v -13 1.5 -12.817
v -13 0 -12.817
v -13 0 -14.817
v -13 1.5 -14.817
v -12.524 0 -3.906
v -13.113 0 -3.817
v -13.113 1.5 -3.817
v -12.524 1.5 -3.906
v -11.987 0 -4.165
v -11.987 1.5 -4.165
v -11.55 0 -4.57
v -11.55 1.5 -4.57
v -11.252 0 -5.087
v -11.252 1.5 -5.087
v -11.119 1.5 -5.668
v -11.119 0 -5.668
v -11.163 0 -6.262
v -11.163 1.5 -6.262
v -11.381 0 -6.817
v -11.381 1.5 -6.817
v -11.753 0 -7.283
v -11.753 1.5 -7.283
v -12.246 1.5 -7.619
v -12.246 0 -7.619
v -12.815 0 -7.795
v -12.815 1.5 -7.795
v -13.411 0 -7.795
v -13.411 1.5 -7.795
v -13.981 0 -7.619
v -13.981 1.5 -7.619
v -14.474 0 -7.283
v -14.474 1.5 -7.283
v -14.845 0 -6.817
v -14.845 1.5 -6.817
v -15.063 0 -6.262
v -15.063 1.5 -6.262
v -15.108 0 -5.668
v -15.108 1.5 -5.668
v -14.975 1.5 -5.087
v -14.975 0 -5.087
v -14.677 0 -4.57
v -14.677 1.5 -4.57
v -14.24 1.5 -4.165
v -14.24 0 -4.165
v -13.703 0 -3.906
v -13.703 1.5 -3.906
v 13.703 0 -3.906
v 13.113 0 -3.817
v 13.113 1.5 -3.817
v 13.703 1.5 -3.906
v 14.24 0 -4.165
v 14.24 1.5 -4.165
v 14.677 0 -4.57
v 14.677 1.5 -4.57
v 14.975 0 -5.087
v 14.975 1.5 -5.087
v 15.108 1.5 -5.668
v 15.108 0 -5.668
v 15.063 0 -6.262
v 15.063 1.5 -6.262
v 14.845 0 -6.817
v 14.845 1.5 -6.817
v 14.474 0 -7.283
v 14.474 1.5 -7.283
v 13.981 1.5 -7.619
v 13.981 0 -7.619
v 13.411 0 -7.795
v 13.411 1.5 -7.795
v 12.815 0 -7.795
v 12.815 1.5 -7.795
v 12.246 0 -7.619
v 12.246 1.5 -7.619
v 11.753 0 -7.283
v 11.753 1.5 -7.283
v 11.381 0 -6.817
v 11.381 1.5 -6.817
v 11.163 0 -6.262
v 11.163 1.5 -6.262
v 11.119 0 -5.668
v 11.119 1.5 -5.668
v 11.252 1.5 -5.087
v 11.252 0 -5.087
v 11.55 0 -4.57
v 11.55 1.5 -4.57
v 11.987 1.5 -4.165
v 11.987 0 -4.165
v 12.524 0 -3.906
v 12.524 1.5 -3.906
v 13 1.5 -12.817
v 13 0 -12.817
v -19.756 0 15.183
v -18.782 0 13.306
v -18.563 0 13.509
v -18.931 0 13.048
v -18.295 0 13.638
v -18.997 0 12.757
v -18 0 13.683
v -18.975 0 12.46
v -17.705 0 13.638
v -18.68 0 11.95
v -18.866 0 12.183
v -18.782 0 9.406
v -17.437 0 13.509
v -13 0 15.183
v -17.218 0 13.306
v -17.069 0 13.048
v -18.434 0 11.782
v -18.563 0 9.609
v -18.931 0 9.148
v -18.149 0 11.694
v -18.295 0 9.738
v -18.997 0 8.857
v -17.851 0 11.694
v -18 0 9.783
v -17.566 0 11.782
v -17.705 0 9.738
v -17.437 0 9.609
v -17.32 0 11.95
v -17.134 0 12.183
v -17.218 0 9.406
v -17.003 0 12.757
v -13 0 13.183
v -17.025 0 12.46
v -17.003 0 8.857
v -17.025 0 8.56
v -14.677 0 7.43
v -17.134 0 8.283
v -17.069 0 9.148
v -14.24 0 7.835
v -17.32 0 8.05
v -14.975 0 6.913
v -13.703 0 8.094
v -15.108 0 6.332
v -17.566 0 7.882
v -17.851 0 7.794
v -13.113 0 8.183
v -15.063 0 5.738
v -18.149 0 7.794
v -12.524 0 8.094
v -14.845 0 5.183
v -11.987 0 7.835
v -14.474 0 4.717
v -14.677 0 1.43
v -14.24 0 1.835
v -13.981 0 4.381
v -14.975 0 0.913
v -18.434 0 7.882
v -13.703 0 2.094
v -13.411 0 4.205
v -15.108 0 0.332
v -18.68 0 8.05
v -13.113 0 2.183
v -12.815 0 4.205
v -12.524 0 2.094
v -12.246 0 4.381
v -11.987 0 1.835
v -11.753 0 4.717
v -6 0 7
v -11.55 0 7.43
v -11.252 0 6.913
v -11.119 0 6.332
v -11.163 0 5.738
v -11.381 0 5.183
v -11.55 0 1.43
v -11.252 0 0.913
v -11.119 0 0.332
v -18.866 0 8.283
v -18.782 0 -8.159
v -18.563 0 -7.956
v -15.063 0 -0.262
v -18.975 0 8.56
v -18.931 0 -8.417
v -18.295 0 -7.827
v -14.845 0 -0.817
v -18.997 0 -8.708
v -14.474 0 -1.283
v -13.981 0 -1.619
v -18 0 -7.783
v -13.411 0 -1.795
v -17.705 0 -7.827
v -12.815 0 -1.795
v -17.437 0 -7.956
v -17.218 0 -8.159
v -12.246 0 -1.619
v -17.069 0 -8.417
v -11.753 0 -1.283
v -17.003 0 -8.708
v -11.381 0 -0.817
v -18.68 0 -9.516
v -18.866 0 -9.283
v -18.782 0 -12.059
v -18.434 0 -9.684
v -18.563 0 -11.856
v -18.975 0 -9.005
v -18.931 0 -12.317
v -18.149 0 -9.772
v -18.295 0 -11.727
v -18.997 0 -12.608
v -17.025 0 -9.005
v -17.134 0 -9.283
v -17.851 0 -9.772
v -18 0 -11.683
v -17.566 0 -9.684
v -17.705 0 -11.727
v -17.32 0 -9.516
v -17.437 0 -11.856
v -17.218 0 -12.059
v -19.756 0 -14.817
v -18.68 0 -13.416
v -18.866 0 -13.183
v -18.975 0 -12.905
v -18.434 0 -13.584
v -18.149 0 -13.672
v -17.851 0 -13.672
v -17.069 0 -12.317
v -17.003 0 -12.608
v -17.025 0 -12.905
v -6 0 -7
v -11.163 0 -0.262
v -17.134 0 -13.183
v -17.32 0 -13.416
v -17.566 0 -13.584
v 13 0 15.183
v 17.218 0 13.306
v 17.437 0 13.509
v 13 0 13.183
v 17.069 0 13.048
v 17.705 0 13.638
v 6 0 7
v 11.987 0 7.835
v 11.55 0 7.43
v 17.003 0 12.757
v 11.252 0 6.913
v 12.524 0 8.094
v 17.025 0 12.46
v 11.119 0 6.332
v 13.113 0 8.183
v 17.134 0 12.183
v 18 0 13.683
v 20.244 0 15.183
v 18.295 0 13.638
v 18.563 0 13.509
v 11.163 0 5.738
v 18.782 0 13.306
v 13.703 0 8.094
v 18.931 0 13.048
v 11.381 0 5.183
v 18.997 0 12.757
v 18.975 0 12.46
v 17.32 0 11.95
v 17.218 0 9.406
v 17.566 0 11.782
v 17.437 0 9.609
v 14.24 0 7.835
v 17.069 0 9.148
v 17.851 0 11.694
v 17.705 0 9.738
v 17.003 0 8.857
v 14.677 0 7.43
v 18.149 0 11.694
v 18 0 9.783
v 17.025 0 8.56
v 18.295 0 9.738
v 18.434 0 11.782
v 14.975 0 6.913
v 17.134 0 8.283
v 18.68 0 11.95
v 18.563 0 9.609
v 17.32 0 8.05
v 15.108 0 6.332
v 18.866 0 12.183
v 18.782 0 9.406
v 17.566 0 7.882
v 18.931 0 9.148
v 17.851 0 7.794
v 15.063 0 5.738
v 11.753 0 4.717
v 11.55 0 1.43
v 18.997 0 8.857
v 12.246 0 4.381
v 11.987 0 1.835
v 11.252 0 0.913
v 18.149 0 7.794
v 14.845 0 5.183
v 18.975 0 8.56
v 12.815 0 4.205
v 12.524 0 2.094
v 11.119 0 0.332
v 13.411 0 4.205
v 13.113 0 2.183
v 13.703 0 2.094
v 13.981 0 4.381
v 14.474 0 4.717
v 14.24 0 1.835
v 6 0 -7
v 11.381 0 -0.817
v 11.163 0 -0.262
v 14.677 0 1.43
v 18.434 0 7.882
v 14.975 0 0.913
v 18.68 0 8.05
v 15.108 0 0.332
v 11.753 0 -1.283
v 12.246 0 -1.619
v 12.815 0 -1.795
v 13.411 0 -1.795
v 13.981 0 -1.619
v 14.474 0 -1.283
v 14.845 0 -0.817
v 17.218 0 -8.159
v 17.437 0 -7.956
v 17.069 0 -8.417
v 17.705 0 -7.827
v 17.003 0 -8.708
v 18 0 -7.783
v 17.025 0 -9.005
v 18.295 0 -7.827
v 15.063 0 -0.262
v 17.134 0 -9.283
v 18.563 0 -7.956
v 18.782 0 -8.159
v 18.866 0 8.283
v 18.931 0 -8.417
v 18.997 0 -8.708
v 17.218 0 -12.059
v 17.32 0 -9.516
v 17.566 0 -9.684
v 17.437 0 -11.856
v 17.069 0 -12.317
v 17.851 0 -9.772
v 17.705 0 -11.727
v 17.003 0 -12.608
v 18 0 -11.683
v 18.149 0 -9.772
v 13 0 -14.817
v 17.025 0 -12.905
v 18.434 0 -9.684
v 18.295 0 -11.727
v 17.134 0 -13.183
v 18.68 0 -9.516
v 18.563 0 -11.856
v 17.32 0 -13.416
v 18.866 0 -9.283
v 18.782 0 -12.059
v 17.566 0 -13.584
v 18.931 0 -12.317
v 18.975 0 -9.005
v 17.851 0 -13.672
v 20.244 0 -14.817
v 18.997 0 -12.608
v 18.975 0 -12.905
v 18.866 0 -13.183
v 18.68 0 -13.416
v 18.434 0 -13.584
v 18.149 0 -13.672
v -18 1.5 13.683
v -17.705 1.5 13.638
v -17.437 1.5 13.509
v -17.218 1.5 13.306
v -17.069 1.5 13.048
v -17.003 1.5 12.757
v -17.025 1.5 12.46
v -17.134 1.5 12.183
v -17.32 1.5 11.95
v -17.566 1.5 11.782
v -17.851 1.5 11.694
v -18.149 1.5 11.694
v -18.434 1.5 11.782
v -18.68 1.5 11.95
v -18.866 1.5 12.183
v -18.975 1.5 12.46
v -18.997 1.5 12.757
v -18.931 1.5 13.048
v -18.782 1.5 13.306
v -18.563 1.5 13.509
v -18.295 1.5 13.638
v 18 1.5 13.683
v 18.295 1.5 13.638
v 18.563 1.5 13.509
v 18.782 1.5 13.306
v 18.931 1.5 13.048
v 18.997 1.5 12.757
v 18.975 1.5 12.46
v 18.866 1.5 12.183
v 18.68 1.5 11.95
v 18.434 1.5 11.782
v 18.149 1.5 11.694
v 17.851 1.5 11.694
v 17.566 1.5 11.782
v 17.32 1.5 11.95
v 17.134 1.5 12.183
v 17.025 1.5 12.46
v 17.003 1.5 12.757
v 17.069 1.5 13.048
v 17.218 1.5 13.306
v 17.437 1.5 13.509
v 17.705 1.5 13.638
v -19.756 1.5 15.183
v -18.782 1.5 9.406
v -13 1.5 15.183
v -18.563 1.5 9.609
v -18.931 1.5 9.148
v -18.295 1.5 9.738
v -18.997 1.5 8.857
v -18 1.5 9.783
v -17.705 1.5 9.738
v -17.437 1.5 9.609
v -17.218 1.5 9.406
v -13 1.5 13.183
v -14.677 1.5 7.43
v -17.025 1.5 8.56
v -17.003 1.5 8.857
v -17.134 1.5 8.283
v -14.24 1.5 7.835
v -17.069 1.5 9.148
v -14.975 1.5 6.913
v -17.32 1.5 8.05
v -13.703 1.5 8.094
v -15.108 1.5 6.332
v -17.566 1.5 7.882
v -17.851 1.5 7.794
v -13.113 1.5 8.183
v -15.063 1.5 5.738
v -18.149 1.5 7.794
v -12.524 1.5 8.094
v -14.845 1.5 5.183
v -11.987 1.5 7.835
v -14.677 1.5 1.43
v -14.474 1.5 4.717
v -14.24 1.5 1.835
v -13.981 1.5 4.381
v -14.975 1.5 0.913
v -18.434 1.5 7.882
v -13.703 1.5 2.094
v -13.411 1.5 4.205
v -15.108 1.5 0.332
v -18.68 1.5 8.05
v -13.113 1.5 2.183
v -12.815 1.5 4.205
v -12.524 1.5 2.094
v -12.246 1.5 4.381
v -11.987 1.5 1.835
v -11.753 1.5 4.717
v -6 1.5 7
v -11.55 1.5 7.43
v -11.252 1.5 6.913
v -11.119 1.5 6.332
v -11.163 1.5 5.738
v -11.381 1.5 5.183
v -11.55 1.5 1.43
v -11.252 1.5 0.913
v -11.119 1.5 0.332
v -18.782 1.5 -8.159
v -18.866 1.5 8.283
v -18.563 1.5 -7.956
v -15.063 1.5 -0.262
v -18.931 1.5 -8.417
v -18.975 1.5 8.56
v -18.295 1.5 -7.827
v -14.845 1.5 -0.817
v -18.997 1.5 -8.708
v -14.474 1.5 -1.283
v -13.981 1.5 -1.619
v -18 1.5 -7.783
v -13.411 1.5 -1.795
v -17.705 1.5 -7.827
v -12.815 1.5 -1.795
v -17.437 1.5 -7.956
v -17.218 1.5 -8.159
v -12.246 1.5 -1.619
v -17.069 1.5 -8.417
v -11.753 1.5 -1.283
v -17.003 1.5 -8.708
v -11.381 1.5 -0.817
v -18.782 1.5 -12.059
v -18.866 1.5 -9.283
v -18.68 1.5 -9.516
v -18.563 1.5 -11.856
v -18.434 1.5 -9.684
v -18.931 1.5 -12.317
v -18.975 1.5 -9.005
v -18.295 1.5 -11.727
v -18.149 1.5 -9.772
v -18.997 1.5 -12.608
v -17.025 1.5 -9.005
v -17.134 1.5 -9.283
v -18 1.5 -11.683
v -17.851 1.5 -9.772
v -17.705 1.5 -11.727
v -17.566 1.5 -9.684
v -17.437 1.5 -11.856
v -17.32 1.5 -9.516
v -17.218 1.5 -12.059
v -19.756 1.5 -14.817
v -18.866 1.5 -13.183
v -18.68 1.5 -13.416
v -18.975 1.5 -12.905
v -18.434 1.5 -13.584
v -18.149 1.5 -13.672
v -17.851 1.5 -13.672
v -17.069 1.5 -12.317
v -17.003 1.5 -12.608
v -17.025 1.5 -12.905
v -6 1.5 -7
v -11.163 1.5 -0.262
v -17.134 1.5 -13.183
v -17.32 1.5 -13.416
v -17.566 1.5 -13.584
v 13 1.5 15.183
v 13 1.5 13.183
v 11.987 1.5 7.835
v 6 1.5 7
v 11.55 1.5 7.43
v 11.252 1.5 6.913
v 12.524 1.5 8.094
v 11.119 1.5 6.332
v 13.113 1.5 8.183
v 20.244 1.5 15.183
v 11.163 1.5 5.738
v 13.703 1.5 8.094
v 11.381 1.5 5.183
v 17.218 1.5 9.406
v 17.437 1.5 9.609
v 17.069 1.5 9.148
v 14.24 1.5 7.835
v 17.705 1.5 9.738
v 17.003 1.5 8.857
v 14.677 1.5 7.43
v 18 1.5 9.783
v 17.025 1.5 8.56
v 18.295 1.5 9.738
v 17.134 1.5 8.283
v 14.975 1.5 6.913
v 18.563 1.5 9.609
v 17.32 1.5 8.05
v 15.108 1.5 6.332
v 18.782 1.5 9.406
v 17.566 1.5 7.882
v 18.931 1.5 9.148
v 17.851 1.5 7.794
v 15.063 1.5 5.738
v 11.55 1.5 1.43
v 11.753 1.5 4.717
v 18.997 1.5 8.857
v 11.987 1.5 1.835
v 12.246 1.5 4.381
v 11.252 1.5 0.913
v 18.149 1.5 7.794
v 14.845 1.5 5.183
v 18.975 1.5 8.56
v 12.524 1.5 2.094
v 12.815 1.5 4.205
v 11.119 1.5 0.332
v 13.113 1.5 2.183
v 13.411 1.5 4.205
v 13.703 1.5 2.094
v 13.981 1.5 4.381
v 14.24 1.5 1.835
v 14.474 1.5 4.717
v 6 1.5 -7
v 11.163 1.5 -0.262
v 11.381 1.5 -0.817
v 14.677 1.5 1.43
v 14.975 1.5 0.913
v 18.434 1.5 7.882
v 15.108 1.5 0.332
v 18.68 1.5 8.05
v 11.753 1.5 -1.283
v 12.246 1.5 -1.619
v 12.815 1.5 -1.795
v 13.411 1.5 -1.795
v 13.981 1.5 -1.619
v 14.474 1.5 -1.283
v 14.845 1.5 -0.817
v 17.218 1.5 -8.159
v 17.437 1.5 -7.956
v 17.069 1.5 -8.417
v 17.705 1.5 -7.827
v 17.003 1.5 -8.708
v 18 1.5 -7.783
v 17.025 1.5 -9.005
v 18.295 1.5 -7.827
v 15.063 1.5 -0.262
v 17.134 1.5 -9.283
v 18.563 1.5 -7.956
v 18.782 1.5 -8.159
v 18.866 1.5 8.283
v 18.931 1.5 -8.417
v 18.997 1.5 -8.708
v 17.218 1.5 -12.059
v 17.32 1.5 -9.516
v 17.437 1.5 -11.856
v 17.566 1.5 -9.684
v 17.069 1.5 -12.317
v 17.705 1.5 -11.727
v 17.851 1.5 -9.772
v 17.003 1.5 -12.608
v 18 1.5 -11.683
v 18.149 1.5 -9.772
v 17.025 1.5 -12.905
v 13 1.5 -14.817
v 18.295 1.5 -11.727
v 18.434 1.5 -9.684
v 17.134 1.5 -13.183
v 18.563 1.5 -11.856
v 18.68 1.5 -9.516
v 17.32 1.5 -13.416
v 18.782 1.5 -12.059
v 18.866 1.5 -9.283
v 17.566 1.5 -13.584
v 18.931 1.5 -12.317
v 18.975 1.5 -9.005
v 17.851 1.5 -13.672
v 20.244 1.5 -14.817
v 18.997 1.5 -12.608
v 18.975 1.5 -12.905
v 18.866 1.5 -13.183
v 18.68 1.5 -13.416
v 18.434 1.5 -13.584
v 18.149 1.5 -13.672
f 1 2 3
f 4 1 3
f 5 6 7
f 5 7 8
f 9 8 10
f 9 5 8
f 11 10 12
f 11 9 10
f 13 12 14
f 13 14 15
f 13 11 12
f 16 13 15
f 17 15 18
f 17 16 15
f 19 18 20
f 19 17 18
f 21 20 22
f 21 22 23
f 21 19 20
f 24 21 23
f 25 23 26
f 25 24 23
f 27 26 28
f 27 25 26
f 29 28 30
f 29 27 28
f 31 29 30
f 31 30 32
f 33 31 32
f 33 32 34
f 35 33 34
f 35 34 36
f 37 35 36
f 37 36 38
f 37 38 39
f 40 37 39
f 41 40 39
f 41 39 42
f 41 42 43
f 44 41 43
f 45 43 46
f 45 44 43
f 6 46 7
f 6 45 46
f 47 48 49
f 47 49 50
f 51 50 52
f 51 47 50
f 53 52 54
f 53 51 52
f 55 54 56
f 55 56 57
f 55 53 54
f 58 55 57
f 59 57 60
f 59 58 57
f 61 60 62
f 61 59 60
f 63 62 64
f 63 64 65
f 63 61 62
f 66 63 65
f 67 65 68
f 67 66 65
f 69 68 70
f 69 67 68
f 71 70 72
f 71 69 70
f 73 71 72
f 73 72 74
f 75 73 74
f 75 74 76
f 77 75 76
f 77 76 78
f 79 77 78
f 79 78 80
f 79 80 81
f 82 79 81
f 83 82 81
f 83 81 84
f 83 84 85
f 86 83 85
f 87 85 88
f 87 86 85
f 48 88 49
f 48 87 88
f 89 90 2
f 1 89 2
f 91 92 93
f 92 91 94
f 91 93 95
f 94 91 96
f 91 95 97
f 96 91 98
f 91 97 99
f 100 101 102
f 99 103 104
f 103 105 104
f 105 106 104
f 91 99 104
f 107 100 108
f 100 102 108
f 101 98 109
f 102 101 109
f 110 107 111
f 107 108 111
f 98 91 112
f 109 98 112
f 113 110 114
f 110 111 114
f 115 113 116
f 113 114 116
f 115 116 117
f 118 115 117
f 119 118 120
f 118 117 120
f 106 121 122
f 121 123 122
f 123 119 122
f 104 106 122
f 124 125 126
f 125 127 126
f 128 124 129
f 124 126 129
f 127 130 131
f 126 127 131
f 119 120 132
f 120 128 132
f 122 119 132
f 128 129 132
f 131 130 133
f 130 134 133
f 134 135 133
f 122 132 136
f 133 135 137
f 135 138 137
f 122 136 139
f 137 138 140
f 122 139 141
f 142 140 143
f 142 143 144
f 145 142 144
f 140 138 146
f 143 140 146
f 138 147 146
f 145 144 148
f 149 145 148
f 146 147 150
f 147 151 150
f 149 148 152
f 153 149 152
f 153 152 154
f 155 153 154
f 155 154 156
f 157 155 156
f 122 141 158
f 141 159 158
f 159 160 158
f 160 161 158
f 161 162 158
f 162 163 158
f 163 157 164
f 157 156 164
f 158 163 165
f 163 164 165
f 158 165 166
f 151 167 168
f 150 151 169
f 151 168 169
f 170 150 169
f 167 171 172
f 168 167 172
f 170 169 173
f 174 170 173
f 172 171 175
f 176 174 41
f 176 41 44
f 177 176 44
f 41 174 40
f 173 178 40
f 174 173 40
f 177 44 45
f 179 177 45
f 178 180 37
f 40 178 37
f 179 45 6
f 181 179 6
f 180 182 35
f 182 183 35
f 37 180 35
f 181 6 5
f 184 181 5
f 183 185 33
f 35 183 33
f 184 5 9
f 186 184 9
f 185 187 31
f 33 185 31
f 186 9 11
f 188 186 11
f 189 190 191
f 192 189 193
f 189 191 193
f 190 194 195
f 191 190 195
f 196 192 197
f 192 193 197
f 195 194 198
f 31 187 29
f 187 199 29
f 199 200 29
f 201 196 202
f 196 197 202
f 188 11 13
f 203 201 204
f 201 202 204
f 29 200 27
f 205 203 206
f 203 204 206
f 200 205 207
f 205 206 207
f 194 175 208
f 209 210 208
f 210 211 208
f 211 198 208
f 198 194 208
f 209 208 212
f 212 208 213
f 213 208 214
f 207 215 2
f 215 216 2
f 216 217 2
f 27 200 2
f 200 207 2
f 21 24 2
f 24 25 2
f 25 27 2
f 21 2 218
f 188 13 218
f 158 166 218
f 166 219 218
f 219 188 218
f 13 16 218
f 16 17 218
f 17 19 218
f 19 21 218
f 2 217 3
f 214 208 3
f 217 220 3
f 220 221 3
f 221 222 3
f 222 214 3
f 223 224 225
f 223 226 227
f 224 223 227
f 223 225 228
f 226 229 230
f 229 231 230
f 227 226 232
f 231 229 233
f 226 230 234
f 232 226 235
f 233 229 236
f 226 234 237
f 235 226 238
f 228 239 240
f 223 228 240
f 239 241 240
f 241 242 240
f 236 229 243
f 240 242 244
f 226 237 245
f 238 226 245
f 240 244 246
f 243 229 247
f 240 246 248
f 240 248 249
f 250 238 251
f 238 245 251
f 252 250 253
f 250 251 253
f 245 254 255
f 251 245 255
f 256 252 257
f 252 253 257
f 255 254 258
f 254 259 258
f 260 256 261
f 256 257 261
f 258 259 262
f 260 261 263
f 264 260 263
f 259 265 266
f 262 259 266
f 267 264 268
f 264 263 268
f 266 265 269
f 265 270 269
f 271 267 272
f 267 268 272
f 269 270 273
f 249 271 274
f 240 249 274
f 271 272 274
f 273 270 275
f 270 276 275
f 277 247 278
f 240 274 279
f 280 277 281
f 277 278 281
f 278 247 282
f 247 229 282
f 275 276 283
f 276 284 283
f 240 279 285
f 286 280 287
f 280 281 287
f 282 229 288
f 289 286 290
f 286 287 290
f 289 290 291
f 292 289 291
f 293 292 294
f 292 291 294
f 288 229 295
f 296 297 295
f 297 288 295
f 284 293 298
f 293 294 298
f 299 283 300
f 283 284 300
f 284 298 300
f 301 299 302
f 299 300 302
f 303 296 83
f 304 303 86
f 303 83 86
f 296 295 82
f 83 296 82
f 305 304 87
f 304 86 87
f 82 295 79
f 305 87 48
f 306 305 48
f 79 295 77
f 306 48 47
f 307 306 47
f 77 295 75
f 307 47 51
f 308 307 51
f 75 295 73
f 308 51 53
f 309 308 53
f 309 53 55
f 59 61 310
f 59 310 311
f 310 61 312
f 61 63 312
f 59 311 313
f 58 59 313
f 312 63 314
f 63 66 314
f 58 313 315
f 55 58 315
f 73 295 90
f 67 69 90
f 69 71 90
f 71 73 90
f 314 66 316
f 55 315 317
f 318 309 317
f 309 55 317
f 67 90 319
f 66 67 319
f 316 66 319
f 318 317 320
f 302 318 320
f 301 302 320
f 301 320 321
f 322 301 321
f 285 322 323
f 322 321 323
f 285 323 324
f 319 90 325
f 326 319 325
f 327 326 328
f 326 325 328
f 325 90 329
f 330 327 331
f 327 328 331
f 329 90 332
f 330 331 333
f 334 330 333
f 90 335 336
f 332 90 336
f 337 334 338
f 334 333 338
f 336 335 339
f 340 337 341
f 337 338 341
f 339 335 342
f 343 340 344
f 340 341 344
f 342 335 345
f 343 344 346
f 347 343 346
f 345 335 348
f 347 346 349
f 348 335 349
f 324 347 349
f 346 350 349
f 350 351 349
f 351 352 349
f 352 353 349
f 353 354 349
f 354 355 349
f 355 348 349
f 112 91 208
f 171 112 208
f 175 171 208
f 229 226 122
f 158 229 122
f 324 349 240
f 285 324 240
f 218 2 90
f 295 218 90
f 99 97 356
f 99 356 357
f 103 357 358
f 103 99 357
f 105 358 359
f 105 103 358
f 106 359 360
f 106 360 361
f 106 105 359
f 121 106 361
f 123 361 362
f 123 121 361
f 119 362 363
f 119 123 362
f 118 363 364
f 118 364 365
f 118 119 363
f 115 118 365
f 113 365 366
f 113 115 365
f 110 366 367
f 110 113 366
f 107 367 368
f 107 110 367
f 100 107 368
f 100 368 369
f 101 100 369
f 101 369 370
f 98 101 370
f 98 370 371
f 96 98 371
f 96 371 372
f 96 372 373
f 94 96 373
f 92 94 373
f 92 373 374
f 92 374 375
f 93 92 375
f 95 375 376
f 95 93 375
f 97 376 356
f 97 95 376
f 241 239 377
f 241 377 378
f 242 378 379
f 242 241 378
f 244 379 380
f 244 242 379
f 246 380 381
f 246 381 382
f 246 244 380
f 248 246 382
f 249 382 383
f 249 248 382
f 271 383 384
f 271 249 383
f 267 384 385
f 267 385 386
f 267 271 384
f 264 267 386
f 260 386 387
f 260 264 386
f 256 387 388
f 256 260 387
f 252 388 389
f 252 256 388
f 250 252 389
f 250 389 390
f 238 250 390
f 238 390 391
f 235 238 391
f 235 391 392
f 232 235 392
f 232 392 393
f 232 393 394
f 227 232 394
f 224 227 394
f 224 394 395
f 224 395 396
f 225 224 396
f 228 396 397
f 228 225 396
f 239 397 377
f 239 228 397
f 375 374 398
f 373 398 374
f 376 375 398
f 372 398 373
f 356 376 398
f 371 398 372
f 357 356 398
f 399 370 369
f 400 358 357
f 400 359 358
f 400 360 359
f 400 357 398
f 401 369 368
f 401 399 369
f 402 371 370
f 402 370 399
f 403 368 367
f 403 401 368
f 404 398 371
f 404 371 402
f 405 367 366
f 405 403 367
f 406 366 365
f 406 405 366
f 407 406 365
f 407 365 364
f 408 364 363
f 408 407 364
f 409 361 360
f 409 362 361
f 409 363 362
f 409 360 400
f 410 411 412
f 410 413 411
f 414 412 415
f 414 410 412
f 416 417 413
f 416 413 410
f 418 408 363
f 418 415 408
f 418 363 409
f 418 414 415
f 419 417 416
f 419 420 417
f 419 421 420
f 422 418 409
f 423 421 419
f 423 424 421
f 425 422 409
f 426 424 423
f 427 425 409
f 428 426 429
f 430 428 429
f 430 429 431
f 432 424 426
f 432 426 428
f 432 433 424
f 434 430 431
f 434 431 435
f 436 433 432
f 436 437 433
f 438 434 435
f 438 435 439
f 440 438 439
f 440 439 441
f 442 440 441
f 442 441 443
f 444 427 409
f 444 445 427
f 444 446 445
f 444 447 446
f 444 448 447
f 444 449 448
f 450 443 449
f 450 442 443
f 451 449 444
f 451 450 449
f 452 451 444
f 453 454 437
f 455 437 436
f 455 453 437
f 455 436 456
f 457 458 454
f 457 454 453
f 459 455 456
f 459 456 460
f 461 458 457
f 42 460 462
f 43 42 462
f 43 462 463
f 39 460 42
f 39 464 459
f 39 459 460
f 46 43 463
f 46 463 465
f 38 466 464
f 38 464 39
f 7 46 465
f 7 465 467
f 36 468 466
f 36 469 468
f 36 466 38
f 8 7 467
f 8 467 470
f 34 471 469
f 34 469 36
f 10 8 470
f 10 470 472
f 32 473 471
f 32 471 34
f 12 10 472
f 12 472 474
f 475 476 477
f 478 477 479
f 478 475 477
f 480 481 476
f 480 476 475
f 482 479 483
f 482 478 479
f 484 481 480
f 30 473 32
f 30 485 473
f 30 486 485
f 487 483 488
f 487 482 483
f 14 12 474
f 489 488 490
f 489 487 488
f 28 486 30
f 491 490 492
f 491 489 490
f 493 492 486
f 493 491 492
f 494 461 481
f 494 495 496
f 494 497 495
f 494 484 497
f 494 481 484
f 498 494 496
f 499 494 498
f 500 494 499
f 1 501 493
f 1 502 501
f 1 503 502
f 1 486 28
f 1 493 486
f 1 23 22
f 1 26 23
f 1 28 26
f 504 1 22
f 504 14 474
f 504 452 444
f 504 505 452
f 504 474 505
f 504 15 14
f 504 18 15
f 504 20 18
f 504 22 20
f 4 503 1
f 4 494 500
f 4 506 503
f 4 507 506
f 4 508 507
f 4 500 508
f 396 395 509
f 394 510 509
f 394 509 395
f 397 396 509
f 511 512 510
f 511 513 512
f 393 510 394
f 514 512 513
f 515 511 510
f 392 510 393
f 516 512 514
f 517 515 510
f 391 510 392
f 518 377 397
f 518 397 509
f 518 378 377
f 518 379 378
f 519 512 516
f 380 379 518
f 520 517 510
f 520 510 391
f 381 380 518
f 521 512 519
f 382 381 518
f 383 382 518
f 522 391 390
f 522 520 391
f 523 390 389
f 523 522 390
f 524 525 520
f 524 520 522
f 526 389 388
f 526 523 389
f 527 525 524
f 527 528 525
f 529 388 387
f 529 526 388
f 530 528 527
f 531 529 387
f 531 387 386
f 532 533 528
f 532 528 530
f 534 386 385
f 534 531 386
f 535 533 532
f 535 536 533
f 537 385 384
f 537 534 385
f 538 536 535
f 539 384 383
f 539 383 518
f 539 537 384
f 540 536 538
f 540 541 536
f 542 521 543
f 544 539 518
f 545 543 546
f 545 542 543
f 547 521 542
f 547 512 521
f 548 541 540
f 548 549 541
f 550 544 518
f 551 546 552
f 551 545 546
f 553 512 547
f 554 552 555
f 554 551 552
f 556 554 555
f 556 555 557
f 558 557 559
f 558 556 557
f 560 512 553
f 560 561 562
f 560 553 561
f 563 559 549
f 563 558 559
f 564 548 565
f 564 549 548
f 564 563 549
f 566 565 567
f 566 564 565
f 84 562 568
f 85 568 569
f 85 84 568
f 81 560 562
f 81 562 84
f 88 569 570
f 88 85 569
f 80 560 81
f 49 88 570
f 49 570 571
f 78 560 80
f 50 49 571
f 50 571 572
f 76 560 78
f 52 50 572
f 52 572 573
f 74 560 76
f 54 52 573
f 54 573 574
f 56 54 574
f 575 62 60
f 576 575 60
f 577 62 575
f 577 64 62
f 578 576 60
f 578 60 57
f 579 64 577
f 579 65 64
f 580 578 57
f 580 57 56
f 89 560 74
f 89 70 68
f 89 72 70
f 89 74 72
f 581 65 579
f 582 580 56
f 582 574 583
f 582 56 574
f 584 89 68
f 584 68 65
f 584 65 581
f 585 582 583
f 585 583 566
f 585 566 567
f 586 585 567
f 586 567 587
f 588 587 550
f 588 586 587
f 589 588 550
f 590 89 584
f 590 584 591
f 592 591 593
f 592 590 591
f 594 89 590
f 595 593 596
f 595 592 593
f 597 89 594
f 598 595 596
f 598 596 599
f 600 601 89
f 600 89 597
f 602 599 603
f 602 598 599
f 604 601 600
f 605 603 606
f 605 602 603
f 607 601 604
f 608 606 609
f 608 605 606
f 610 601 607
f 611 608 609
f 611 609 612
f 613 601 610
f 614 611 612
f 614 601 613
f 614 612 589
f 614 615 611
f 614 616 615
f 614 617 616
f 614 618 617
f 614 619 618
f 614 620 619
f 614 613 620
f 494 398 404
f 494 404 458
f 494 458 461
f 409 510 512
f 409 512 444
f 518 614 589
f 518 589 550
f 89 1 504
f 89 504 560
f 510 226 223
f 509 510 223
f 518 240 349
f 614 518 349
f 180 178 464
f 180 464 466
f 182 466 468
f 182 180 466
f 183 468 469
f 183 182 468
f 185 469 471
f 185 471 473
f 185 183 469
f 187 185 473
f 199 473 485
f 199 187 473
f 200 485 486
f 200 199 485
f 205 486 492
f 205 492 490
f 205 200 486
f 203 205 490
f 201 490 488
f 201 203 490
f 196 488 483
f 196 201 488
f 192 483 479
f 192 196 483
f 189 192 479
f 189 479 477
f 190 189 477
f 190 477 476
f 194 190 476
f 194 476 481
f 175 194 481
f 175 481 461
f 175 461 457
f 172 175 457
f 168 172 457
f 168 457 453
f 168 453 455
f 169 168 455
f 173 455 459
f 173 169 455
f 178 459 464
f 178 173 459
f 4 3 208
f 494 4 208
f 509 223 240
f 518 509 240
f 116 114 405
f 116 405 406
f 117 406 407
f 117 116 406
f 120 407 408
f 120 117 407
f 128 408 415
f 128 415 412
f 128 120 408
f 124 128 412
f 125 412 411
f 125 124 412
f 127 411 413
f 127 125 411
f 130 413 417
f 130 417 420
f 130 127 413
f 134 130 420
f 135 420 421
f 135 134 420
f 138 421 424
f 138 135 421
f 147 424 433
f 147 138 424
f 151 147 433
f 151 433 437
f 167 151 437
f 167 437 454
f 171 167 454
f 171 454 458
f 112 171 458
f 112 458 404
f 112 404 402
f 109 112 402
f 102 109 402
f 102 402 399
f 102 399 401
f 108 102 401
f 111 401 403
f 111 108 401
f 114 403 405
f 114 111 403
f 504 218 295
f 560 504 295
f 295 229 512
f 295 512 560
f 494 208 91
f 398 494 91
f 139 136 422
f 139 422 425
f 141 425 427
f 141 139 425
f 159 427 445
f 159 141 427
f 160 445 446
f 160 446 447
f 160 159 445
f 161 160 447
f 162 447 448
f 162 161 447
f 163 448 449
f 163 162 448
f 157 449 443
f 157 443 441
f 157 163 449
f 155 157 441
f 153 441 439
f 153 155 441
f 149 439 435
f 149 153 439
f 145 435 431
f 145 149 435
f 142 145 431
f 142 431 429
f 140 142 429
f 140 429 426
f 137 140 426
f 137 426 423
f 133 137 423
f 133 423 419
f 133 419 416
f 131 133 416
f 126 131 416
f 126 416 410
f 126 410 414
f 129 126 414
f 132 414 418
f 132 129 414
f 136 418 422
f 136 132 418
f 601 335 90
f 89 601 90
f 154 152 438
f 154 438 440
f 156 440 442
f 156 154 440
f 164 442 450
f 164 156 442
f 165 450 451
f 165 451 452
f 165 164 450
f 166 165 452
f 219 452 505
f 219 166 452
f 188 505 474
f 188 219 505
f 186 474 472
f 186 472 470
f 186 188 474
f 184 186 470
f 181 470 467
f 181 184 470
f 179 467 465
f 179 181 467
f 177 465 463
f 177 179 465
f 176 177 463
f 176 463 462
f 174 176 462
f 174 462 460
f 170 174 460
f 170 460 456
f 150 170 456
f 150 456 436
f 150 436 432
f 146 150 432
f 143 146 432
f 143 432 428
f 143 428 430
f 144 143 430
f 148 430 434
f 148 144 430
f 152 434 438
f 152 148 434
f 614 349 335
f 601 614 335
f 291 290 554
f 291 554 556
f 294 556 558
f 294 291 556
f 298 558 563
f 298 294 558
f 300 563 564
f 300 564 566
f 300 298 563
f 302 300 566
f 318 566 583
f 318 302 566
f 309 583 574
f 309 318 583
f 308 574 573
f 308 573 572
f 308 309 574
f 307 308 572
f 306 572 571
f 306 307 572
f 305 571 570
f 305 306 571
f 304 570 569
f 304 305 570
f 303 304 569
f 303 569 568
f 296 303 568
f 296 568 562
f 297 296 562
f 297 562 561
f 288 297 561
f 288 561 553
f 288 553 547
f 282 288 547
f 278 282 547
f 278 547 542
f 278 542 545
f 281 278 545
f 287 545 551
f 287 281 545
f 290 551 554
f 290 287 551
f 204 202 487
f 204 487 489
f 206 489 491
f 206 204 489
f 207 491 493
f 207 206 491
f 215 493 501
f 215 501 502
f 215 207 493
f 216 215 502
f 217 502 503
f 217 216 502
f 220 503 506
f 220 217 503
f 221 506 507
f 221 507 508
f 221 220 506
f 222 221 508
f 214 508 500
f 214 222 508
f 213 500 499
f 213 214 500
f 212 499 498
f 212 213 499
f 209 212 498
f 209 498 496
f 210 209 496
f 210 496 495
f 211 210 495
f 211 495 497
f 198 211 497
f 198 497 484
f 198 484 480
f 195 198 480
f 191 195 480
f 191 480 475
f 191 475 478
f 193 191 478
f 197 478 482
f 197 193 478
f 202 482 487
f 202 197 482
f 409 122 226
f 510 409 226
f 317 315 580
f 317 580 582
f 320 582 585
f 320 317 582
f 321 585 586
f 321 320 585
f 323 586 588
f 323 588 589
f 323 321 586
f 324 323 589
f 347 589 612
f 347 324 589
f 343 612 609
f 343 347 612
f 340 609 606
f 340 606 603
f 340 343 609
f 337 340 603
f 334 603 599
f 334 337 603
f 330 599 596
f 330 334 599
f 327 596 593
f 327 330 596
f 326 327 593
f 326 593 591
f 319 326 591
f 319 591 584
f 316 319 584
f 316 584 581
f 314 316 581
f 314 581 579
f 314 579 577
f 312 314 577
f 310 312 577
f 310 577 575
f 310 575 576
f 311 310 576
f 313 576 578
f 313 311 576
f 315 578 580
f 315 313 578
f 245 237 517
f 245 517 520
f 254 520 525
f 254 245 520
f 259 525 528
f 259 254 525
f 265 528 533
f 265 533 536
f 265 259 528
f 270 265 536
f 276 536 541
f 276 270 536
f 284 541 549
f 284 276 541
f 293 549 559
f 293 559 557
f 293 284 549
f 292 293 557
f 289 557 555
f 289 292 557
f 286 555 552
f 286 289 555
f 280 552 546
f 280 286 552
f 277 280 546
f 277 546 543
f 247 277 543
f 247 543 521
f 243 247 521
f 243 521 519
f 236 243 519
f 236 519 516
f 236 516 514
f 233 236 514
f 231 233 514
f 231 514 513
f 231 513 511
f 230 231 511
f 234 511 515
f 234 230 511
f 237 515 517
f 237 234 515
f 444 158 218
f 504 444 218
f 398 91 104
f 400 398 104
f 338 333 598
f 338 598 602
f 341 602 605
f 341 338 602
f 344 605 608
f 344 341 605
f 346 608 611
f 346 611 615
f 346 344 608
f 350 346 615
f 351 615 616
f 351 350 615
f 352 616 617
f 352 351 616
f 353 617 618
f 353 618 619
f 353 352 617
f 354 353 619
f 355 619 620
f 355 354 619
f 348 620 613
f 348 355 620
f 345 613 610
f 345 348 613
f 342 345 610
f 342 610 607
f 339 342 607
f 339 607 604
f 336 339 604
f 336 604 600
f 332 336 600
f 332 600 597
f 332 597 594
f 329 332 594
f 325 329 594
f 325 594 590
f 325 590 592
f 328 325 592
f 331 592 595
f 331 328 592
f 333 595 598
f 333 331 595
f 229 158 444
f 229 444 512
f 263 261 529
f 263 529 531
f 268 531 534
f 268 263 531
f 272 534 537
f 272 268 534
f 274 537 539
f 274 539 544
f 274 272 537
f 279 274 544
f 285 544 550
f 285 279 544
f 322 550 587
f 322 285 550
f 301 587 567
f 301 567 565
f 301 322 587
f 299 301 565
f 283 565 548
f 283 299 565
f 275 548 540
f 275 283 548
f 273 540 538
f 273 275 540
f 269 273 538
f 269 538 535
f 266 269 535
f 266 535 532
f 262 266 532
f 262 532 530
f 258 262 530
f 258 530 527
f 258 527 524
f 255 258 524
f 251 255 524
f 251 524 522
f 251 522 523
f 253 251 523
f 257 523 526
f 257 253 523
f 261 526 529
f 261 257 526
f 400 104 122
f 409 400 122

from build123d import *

# Parameters (mm, degrees)
TOP_PLATE_2_SKETCH_R   = 1
TOP_PLATE_2_SKETCH_R_2 = 2
TOP_PLATE_2_SKETCH_W   = 12
TOP_PLATE_2_SKETCH_H   = 14
TOP_PLATE_2_DEPTH      = 1.5


with BuildPart() as part:
    # Top Plate 2 Sketch → Top Plate 2 (new body)
    with BuildSketch(Plane(origin=(0, 0, 0), x_dir=(1, 0, 0), z_dir=(0, 1, 0))):
        Polygon((-13, 14.817316164), (-19.756421551, 14.817316164), (-19.756421551, -15.182683836), (-13, -15.182683836), (-13, -13.182683836), (13, -13.182683836), (13, -15.182683836), (20.243578449, -15.182683836), (20.243578449, 14.817316164), (13, 14.817316164), (13, 12.817316164), (-13, 12.817316164), align=None)
        with Locations(Location((-18, -12.682683836, 0), (0, 0, 270))):
            Circle(TOP_PLATE_2_SKETCH_R, mode=Mode.SUBTRACT)
        with Locations(Location((-18, -8.782683836, 0), (0, 0, 270))):
            Circle(TOP_PLATE_2_SKETCH_R, mode=Mode.SUBTRACT)
        with Locations(Location((-13.113273082, -6.182683836, 0), (0, 0, 270))):
            Circle(TOP_PLATE_2_SKETCH_R_2, mode=Mode.SUBTRACT)
        with Locations(Location((18, -12.682683836, 0), (0, 0, 270))):
            Circle(TOP_PLATE_2_SKETCH_R, mode=Mode.SUBTRACT)
        with Locations(Location((18, -8.782683836, 0), (0, 0, 270))):
            Circle(TOP_PLATE_2_SKETCH_R, mode=Mode.SUBTRACT)
        with Locations(Location((13.113273082, -6.182683836, 0), (0, 0, 270))):
            Circle(TOP_PLATE_2_SKETCH_R_2, mode=Mode.SUBTRACT)
        with Locations(Location((-13.113273082, -0.182683836, 0), (0, 0, 270))):
            Circle(TOP_PLATE_2_SKETCH_R_2, mode=Mode.SUBTRACT)
        with Locations(Location((-13.113273082, 5.817316164, 0), (0, 0, 270))):
            Circle(TOP_PLATE_2_SKETCH_R_2, mode=Mode.SUBTRACT)
        Rectangle(TOP_PLATE_2_SKETCH_W, TOP_PLATE_2_SKETCH_H, mode=Mode.SUBTRACT)
        with Locations(Location((-18, 8.782683836, 0), (0, 0, 270))):
            Circle(TOP_PLATE_2_SKETCH_R, mode=Mode.SUBTRACT)
        with Locations(Location((-18, 12.682683836, 0), (0, 0, 270))):
            Circle(TOP_PLATE_2_SKETCH_R, mode=Mode.SUBTRACT)
        with Locations(Location((13.113273082, -0.182683836, 0), (0, 0, 270))):
            Circle(TOP_PLATE_2_SKETCH_R_2, mode=Mode.SUBTRACT)
        with Locations(Location((13.113273082, 5.817316164, 0), (0, 0, 270))):
            Circle(TOP_PLATE_2_SKETCH_R_2, mode=Mode.SUBTRACT)
        with Locations(Location((18, 8.782683836, 0), (0, 0, 270))):
            Circle(TOP_PLATE_2_SKETCH_R, mode=Mode.SUBTRACT)
        with Locations(Location((18, 12.682683836, 0), (0, 0, 270))):
            Circle(TOP_PLATE_2_SKETCH_R, mode=Mode.SUBTRACT)
    extrude(amount=TOP_PLATE_2_DEPTH)


solid = part.part
